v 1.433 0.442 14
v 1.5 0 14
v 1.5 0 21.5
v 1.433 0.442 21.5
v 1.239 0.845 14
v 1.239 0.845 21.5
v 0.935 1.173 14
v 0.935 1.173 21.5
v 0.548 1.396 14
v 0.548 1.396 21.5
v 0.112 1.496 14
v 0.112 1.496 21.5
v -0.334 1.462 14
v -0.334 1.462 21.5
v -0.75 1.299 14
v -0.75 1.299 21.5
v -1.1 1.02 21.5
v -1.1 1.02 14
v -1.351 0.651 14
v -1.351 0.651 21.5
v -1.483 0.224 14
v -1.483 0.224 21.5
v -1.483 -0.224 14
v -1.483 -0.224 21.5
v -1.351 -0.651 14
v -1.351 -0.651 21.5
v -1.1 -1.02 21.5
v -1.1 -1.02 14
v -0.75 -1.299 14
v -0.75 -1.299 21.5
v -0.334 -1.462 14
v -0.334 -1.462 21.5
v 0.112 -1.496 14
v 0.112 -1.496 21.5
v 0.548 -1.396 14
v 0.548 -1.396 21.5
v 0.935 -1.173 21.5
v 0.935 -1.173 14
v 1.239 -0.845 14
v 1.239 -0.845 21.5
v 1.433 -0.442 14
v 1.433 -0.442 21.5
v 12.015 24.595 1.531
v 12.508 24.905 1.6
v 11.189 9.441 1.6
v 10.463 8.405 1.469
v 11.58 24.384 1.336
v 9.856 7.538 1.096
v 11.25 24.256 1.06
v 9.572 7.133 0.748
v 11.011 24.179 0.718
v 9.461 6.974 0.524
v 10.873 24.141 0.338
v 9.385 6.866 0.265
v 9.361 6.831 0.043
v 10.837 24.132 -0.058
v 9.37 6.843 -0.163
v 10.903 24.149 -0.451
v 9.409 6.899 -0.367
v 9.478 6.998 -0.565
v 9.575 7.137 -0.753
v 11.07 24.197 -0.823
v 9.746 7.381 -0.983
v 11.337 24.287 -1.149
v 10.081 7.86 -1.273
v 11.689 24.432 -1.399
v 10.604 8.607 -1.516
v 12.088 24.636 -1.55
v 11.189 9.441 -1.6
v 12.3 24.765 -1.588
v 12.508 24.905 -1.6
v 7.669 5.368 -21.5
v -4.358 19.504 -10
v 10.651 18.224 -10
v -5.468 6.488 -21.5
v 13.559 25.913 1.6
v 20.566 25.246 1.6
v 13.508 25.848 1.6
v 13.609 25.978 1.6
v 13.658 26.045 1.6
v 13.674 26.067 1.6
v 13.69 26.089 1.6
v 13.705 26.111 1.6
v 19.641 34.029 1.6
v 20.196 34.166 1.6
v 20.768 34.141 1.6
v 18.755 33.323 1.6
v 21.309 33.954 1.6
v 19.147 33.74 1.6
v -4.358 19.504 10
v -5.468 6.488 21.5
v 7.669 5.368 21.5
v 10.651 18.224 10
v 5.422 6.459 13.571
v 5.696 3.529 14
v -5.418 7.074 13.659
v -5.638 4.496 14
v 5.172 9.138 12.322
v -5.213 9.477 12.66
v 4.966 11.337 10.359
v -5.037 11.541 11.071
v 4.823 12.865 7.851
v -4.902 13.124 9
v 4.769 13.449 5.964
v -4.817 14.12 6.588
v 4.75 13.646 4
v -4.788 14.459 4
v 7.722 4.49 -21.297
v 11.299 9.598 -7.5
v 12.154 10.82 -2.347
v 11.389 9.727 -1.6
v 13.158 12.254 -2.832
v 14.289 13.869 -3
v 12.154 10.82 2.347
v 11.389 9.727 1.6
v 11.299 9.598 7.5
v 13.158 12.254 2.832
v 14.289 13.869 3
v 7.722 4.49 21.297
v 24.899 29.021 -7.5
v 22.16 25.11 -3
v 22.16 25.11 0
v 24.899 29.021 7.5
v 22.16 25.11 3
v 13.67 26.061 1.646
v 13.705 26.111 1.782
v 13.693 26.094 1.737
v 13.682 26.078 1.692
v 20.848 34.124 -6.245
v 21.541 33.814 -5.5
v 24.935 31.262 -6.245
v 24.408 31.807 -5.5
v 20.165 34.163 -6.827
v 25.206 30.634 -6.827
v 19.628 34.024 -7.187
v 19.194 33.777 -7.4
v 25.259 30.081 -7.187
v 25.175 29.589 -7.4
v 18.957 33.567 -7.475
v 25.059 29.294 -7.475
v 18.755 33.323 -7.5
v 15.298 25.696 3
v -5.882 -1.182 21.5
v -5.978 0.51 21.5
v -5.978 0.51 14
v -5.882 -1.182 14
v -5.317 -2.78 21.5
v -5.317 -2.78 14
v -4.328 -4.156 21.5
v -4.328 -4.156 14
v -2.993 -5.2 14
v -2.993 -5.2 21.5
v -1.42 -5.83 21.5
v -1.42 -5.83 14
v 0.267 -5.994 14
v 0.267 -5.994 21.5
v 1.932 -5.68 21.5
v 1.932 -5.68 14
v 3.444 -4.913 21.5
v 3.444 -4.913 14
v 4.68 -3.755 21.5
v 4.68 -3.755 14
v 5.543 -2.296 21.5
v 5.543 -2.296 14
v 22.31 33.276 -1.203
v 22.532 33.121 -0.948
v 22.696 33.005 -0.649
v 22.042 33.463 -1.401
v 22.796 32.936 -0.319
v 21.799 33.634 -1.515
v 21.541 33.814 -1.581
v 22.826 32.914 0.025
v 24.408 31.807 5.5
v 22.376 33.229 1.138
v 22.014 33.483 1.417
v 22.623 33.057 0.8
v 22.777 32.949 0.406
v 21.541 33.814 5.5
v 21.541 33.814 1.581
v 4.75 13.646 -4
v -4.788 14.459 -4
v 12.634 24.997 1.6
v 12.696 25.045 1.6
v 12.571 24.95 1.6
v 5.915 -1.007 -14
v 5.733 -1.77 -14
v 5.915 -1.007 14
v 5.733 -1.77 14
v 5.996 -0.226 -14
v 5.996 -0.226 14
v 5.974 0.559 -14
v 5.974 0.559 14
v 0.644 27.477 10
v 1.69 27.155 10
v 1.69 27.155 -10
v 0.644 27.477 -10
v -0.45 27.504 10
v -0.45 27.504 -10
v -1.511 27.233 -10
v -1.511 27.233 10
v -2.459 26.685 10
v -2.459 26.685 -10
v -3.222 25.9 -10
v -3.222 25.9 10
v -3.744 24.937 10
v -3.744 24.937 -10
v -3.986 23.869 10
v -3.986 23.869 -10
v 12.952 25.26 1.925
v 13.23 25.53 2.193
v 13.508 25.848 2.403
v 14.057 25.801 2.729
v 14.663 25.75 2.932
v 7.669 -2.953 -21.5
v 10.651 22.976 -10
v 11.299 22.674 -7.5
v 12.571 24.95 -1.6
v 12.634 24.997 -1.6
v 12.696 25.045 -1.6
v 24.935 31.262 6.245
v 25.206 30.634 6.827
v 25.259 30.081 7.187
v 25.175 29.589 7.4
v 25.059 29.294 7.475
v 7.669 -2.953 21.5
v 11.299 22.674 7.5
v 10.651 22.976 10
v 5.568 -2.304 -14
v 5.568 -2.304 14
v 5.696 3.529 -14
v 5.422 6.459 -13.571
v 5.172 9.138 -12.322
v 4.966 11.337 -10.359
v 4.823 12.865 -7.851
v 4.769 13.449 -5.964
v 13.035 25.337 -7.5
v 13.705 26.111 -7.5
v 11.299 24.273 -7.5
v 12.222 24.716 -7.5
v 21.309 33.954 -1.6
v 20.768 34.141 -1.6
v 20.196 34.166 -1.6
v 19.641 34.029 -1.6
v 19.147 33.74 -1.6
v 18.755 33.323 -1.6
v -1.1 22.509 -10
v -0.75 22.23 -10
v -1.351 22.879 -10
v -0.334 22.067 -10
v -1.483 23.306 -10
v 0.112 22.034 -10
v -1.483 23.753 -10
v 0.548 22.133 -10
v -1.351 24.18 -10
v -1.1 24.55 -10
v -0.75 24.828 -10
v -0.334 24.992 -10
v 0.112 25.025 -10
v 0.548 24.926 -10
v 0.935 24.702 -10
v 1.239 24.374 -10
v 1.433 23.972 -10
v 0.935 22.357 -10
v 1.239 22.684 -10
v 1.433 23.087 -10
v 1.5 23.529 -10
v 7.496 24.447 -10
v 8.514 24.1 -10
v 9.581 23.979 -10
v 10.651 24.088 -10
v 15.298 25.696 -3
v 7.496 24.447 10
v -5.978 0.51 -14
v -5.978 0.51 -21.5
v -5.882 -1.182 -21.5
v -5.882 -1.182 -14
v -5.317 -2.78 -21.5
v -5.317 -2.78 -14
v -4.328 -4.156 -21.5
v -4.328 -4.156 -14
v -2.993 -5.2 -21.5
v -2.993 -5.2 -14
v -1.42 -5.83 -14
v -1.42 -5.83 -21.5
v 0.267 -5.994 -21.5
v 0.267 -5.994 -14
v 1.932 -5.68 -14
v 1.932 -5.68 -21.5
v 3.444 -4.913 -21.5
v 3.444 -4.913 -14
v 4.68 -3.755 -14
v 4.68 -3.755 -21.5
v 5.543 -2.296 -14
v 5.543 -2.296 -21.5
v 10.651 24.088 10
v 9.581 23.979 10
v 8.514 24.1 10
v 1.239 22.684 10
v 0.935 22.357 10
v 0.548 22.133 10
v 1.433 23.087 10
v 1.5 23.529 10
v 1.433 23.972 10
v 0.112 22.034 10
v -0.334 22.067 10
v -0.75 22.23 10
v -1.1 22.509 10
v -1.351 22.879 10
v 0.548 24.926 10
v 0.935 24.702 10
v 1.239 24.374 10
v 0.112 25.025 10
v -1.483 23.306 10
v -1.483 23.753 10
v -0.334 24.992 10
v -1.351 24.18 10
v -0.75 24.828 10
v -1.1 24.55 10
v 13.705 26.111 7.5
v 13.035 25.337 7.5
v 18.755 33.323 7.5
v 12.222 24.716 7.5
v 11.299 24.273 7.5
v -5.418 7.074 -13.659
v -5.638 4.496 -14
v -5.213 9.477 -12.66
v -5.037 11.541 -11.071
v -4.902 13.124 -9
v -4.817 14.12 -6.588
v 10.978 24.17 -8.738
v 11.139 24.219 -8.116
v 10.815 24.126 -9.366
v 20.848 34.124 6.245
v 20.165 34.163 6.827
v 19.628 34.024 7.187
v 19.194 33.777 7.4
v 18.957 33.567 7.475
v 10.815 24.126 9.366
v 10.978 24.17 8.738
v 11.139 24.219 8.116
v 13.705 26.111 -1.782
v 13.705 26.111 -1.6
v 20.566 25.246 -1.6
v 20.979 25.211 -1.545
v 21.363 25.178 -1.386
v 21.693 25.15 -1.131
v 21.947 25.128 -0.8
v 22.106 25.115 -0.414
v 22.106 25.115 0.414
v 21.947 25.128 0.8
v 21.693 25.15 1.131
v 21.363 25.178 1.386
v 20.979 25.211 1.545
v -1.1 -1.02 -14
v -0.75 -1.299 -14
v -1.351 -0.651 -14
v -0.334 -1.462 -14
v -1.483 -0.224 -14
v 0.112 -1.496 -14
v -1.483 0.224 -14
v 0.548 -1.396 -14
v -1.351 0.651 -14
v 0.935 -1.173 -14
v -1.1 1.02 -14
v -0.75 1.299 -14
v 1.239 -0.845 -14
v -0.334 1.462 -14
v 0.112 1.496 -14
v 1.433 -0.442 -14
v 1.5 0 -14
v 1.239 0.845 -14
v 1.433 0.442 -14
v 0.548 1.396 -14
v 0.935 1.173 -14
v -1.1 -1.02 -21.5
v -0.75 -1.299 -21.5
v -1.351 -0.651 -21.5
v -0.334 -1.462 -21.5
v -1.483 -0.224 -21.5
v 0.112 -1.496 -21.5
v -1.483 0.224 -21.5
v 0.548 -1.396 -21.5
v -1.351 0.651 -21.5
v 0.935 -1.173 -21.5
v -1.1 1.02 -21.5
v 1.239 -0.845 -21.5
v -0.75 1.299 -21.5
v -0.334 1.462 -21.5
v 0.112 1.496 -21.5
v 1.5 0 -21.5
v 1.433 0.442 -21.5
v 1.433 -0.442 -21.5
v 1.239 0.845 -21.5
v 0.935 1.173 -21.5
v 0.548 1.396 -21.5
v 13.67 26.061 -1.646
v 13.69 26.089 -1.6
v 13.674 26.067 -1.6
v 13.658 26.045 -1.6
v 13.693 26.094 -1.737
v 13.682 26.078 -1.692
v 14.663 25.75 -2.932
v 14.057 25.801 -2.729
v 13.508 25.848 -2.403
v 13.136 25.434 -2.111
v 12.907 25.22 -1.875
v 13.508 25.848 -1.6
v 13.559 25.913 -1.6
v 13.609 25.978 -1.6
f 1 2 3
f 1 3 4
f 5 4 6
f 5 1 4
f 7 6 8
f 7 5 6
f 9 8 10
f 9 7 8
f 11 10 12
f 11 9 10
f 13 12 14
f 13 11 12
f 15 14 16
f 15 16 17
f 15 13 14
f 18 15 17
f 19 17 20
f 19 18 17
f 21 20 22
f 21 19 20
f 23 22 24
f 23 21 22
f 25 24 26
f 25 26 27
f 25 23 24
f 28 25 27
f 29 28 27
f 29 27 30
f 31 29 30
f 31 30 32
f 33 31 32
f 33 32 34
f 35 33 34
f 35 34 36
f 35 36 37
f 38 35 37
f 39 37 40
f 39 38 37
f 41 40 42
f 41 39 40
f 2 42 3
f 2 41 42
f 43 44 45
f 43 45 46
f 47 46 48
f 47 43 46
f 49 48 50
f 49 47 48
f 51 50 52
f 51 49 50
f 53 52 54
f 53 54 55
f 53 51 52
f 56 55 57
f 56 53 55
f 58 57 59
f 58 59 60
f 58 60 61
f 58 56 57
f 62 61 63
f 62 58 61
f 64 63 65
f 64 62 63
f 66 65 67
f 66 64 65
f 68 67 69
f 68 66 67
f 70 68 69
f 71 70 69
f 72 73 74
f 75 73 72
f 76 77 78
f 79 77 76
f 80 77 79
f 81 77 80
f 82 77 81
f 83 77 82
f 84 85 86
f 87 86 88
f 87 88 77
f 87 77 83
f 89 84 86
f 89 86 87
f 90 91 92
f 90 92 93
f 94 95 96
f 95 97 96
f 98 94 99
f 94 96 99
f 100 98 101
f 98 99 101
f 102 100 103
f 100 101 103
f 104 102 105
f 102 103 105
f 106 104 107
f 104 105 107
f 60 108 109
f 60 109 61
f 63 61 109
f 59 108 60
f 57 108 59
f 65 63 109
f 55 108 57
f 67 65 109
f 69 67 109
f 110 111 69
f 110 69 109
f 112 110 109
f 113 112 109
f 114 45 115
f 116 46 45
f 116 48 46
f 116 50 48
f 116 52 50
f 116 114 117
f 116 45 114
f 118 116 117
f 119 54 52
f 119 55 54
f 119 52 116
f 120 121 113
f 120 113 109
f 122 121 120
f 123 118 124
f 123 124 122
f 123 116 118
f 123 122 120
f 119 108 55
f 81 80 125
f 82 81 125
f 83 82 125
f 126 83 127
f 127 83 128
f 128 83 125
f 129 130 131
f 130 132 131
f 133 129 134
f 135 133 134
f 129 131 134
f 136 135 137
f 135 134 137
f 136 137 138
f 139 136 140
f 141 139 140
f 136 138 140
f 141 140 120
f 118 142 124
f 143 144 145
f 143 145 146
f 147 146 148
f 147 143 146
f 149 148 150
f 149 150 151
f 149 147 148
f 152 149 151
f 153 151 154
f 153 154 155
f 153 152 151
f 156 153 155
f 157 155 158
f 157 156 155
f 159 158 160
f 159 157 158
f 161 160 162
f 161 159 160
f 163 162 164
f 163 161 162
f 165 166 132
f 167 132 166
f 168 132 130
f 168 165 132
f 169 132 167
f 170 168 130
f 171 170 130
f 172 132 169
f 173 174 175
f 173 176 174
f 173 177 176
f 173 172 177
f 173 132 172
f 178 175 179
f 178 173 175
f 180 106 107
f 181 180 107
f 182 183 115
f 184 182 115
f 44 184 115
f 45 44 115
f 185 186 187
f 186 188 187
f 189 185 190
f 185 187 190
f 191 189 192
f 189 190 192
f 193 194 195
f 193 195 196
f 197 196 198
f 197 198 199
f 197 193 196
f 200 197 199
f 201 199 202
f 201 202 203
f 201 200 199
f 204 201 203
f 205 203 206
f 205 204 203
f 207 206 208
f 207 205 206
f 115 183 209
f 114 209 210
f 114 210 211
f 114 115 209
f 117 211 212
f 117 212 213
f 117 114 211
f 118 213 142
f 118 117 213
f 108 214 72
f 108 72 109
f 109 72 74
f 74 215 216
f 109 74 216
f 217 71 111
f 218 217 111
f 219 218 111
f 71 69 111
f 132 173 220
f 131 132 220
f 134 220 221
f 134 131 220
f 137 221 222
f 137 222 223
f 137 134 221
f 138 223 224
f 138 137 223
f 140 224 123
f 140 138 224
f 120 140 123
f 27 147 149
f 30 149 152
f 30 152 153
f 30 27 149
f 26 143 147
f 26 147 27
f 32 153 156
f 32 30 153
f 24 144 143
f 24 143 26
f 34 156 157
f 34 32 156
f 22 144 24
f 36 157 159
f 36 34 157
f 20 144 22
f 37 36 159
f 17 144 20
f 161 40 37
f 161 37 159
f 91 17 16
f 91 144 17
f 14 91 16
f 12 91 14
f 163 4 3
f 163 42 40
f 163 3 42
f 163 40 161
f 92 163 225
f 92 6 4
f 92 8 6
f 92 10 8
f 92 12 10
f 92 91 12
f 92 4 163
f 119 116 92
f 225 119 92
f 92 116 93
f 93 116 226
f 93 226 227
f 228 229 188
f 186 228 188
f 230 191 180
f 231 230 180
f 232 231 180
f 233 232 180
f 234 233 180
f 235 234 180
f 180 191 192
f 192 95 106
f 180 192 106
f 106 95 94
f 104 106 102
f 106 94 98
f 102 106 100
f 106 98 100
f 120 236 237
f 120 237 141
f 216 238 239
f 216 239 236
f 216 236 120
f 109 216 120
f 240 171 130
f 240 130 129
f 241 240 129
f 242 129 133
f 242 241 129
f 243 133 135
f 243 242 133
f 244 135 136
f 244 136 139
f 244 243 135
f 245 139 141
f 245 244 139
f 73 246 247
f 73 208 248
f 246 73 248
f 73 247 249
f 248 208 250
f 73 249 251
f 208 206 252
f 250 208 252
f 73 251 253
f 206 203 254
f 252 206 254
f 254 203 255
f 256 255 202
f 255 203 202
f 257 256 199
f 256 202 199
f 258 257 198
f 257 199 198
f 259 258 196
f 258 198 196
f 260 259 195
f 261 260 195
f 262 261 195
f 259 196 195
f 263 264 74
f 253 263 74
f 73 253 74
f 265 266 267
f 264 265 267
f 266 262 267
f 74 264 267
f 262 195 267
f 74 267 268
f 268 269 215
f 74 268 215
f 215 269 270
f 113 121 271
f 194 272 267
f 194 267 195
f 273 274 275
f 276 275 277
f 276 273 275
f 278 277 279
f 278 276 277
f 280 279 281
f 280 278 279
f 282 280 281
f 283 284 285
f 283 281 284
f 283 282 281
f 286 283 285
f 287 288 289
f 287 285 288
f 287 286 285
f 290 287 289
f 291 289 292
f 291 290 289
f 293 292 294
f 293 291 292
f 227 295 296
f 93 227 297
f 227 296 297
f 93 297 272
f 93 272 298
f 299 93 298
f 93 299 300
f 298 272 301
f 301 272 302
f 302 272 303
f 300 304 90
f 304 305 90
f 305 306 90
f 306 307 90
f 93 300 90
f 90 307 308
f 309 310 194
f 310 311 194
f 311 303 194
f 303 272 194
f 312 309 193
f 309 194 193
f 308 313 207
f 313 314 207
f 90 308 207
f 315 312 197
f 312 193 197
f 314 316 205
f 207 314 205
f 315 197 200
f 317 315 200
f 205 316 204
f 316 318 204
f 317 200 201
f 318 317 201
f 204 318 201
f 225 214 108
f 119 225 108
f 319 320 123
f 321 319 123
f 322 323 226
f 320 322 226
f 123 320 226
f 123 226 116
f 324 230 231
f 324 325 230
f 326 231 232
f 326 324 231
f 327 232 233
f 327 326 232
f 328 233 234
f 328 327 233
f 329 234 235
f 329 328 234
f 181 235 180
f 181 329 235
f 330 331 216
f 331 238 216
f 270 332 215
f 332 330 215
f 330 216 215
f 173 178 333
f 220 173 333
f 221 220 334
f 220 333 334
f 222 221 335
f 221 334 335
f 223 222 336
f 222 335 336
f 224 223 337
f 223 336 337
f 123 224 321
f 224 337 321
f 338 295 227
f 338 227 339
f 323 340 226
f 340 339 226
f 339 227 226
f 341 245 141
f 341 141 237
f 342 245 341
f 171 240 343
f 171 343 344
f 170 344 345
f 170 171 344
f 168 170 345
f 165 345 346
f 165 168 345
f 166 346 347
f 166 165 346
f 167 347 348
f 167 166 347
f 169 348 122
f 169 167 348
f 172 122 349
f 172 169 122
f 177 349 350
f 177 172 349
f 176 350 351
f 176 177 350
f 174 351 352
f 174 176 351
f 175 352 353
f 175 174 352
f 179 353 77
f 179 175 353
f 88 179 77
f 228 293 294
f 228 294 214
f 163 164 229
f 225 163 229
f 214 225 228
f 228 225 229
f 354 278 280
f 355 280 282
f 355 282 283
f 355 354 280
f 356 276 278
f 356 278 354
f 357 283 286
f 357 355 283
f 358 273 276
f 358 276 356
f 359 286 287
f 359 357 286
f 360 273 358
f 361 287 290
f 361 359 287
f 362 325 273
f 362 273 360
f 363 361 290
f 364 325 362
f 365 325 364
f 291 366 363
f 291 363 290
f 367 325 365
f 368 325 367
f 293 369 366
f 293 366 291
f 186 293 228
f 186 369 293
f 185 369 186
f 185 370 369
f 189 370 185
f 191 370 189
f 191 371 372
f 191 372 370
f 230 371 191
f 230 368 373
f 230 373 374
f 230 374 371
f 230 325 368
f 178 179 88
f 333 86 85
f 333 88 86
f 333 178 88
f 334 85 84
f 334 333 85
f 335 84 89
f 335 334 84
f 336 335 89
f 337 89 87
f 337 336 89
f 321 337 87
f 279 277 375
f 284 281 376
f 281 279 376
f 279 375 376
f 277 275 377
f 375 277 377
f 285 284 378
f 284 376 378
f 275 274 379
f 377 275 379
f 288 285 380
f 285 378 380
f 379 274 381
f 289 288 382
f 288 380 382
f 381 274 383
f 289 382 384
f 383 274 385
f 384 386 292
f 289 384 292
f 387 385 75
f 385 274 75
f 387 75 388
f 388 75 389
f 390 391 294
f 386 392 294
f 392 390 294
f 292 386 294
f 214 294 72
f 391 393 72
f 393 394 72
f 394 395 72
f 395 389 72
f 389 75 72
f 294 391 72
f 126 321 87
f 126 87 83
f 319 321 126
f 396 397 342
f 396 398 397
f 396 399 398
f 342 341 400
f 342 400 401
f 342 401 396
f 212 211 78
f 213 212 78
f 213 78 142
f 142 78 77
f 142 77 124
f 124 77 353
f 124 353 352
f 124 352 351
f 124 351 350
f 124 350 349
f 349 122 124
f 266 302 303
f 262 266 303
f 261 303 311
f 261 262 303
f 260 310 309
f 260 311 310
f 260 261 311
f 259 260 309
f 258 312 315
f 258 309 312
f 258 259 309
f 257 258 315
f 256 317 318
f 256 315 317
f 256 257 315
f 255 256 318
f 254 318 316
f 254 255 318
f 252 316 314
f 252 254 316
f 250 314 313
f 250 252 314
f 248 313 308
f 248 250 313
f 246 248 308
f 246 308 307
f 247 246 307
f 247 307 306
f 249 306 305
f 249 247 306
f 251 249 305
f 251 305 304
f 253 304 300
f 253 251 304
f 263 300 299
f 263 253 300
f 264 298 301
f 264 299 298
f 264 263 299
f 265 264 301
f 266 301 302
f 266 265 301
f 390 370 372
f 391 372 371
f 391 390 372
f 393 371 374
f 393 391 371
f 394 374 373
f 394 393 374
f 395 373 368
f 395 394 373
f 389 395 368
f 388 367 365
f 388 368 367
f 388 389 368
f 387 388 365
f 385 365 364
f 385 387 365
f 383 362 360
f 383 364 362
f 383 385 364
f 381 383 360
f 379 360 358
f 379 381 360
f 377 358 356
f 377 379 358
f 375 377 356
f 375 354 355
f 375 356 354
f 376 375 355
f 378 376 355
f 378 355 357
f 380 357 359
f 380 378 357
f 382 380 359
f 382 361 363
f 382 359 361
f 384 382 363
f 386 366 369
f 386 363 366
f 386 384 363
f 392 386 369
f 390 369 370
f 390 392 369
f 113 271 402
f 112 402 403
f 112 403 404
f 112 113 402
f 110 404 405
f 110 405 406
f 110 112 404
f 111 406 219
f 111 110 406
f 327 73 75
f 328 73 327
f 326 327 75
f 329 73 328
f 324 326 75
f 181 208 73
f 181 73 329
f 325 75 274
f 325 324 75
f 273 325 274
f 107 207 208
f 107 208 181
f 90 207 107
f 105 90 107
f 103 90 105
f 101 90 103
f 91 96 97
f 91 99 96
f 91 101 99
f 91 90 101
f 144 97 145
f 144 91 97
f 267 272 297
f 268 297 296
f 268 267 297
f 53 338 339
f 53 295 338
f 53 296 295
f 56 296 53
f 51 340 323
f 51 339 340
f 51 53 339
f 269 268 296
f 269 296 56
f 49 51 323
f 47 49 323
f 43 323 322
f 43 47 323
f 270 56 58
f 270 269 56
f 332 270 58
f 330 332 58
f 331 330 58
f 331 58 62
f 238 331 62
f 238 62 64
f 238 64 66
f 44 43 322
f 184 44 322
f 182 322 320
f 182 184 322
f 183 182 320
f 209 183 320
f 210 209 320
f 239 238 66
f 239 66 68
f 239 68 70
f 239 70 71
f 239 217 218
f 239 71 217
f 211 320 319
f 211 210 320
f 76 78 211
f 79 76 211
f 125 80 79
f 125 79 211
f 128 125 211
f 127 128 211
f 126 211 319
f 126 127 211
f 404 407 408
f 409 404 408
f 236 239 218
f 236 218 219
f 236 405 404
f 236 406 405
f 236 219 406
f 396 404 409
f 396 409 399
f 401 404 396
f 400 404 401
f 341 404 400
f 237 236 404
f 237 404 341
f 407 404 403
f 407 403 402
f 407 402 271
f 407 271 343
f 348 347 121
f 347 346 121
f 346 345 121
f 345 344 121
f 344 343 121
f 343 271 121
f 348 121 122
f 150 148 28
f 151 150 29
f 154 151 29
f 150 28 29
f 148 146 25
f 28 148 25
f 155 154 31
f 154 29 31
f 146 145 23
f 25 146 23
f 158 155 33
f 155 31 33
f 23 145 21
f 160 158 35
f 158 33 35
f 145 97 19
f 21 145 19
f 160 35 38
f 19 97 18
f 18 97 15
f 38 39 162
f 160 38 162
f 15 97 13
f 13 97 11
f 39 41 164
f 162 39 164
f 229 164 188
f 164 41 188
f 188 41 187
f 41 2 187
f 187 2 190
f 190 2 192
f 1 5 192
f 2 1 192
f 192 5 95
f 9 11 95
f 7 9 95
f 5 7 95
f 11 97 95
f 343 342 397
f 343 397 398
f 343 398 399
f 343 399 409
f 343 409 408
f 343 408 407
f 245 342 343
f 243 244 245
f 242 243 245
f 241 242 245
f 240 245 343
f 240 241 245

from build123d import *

# Parameters (mm, degrees)
SKETCH2_R                 = 1.5
MAIN_EXTRUDE_DEPTH        = 21.5
HORIZONTAL_CUT_DEPTH      = 48.59062889
HORIZONTAL_CUT_DEPTH_BACK = 48.59062889
SKETCH5_OUTSIDE_W         = 47.542
SKETCH5_OUTSIDE_H         = 58.496
VERTICAL_CUT_DEPTH        = 15.063100578
END_FILLET_R              = 2
SPRING_PLACE_CUT_DEPTH    = 14
FILLET5_R                 = 10
FILLET4_R                 = 5
CUT_EXTRUDE1_DEPTH        = 52.882041504
CUT_EXTRUDE2_START        = -16.243126
CUT_EXTRUDE2_DEPTH        = 16.243126


# Read off the part's stored shape, not the designer's step: vertical-cut
with BuildPart() as part:
    # Sketch2 → main-extrude (new, symmetric)
    with BuildSketch(Plane.XY):
        with BuildLine():
            Line((26.046045858, 30.659682992), (19.902405526, 34.961506265))
            Line((19.902405526, 34.961506265), (11.298758981, 22.6742256))
            Line((11.298758981, 22.6742256), (1.690473047, 27.154642913))
            ThreePointArc((1.690473047, 27.154642913), (-2.003746596, 26.991347579), (-3.985523805, 23.869411765))
            Line((-3.985523805, 23.869411765), (-5.978285707, 0.51))
            ThreePointArc((-5.978285707, 0.51), (-1.419809226, -5.829591904), (5.543277195, -2.296100594))
            Line((5.543277195, -2.296100594), (7.669311717, -2.952527164))
            Line((7.669311717, -2.952527164), (7.722039638, 4.490290033))
            Line((7.722039638, 4.490290033), (26.046045858, 30.659682992))
        make_face()
        Circle(SKETCH2_R, mode=Mode.SUBTRACT)
        with Locations((0, 23.529411765)):
            Circle(SKETCH2_R, mode=Mode.SUBTRACT)
    extrude(amount=MAIN_EXTRUDE_DEPTH, both=True)

    # Sketch5 outside → horizontal-cut (cut, two sides: drawn at the far end of the back side and taken through both)
    with BuildSketch(Plane(origin=(0, 27.529411765, 0), x_dir=(-1, 0, 0), z_dir=(0, -1, 0)).offset(-HORIZONTAL_CUT_DEPTH_BACK)):
        with Locations((-10.023, 0)):
            Rectangle(SKETCH5_OUTSIDE_W, SKETCH5_OUTSIDE_H)
        Polygon((-5.543277195, -21.5), (6, -21.5), (6, 21.5), (-5.543277195, 21.5), (-7.669311717, 21.5), (-11.298758981, 7.5), (-26.046045858, 7.5), (-26.046045858, -7.5), (-11.298758981, -7.5), (-7.669311717, -21.5), align=None, mode=Mode.SUBTRACT)
    extrude(amount=HORIZONTAL_CUT_DEPTH + HORIZONTAL_CUT_DEPTH_BACK, mode=Mode.SUBTRACT)

    # vertical-cut outline → vertical-cut (cut)
    with BuildSketch(Plane(origin=(-1.956623805, 47.652438964, 0), x_dir=(0, 0, 1), z_dir=(0.9963809512430475, -0.08499999999999992, 0))):
        Polygon((10, 28.250815058), (10, 18), (21.5, 18), (21.5, 41.313669441), align=None)
        Polygon((-21.5, 18), (-10, 18), (-10, 28.250815058), (-21.5, 41.313669441), align=None)
    extrude(amount=VERTICAL_CUT_DEPTH, mode=Mode.SUBTRACT)

    # end-fillet
    end_fillet_edges = [part.edges().sort_by_distance(p)[0] for p in [
        (19.902405526, 34.961506265, 0),
        (26.046045858, 30.659682992, 0),
        (22.974225692, 32.810594628, 7.5),
        (22.974225692, 32.810594628, -7.5),
    ]]
    fillet(end_fillet_edges, radius=END_FILLET_R)

    # Sketch13 → spring-place-cut (cut, symmetric)
    with BuildSketch(Plane.XY):
        with BuildLine():
            Line((4.750311853, 13.645607612), (-4.788285707, 14.459333317))
            Line((-4.788285707, 14.459333317), (-5.468285707, 6.488285707))
            Line((-5.468285707, 6.488285707), (-5.978285707, 0.51))
            ThreePointArc((-5.978285707, 0.51), (-1.419809226, -5.829591904), (5.543277195, -2.296100594))
            Line((5.543277195, -2.296100594), (5.568173284, -2.303787419))
            Line((5.568173284, -2.303787419), (5.732956787, -1.770086573))
            ThreePointArc((5.732956787, -1.770086573), (5.96812639, -0.61763047), (5.973944242, 0.558560826))
            Line((5.973944242, 0.558560826), (4.750311853, 13.645607612))
        make_face()
    extrude(amount=SPRING_PLACE_CUT_DEPTH, both=True, mode=Mode.SUBTRACT)

    # Fillet5
    fillet5_edges = [part.edges().sort_by_distance(p)[0] for p in [
        (-0.018986927, 14.052470465, 14),
        (-0.018986927, 14.052470465, -14),
    ]]
    fillet(fillet5_edges, radius=FILLET5_R)

    # Fillet4
    # the kernel refuses this fillet: 5 mm, written as the material it adds along each edge
    with BuildSketch(Plane(origin=(11.298758981, 22.6742256, -17.98874539), x_dir=(-0.9063077870366477, 0.42261826174070405, 0), z_dir=(0, 0, 1))) as fillet4_piece_1_section:
        with BuildLine():
            CenterArc((FILLET4_R * 0.839099631177, -FILLET4_R), FILLET4_R, 90, 80)
            Line((-FILLET4_R * 0.145708121835, -FILLET4_R * 0.826351822333), (0, 0))
            Line((0, 0), (FILLET4_R * 0.839099631177, 0))
        make_face()
    fillet4_piece_1 = extrude(amount=25.48874539, mode=Mode.PRIVATE)
    fillet4_piece_1 = split(fillet4_piece_1, bisect_by=Plane(origin=(9.938648559, 23.630642265, -10), z_dir=(0, 0, 1)), keep=Keep.TOP, mode=Mode.PRIVATE)
    fillet4_piece_1 = split(fillet4_piece_1, bisect_by=Plane(origin=(10.933336463, 23.630642265, -8.909557674), z_dir=(-0.9679999612731994, 0, 0.25095034364408525)), keep=Keep.TOP, mode=Mode.PRIVATE)
    fillet4_piece_1 = split(fillet4_piece_1, bisect_by=Plane(origin=(9.938648559, 23.630642265, -7.5), z_dir=(0, 0, -1)), keep=Keep.TOP, mode=Mode.PRIVATE)
    add(fillet4_piece_1)
    with BuildSketch(Plane(origin=(11.298758981, 22.6742256, -7.5), x_dir=(-0.9063077870366477, 0.42261826174070405, 0), z_dir=(0, 0, 1))) as fillet4_piece_2_section:
        with BuildLine():
            CenterArc((FILLET4_R * 0.839099631177, -FILLET4_R), FILLET4_R, 90, 80)
            Line((-FILLET4_R * 0.145708121835, -FILLET4_R * 0.826351822333), (0, 0))
            Line((0, 0), (FILLET4_R * 0.839099631177, 0))
        make_face()
    fillet4_piece_2 = extrude(amount=15, mode=Mode.PRIVATE)
    fillet4_piece_2 = split(fillet4_piece_2, bisect_by=Plane(origin=(13.081425039, 23.673797808, 0.623656853), z_dir=(-0.9679999612731994, 0, -0.2509503436440852)), keep=Keep.TOP, mode=Mode.PRIVATE)
    fillet4_piece_2 = split(fillet4_piece_2, bisect_by=Plane(origin=(13.081425039, 23.673797808, -0.623656853), z_dir=(-0.9679999612731994, 0, 0.25095034364408525)), keep=Keep.TOP, mode=Mode.PRIVATE)
    add(fillet4_piece_2)
    with BuildSketch(Plane(origin=(11.298758981, 22.6742256, -7.5), x_dir=(-0.9063077870366477, 0.42261826174070405, 0), z_dir=(0, 0, 1))) as fillet4_piece_3_section:
        with BuildLine():
            CenterArc((FILLET4_R * 0.839099631177, -FILLET4_R), FILLET4_R, 90, 80)
            Line((-FILLET4_R * 0.145708121835, -FILLET4_R * 0.826351822333), (0, 0))
            Line((0, 0), (FILLET4_R * 0.839099631177, 0))
        make_face()
    fillet4_piece_3 = extrude(amount=15, mode=Mode.PRIVATE)
    fillet4_piece_3 = split(fillet4_piece_3, bisect_by=Plane(origin=(14.480371863, 24.591366471, -4.772552021), z_dir=(-0.9679999612731994, 0, -0.2509503436440852)), keep=Keep.TOP, mode=Mode.PRIVATE)
    fillet4_piece_3 = split(fillet4_piece_3, bisect_by=Plane(origin=(11.912432267, 24.591366471, -5.132855534), z_dir=(0.9679999612731994, 0, -0.25095034364408525)), keep=Keep.TOP, mode=Mode.PRIVATE)
    add(fillet4_piece_3)
    with BuildSketch(Plane(origin=(11.298758981, 22.6742256, -7.5), x_dir=(-0.9063077870366477, 0.42261826174070405, 0), z_dir=(0, 0, 1))) as fillet4_piece_4_section:
        with BuildLine():
            CenterArc((FILLET4_R * 0.839099631177, -FILLET4_R), FILLET4_R, 90, 80)
            Line((-FILLET4_R * 0.145708121835, -FILLET4_R * 0.826351822333), (0, 0))
            Line((0, 0), (FILLET4_R * 0.839099631177, 0))
        make_face()
    fillet4_piece_4 = extrude(amount=15, mode=Mode.PRIVATE)
    fillet4_piece_4 = split(fillet4_piece_4, bisect_by=Plane(origin=(11.912432267, 24.591366471, 5.132855534), z_dir=(0.9679999612731994, 0, 0.2509503436440852)), keep=Keep.TOP, mode=Mode.PRIVATE)
    fillet4_piece_4 = split(fillet4_piece_4, bisect_by=Plane(origin=(14.480371863, 24.591366471, 4.772552021), z_dir=(-0.9679999612731994, 0, 0.25095034364408525)), keep=Keep.TOP, mode=Mode.PRIVATE)
    add(fillet4_piece_4)
    with BuildSketch(Plane(origin=(11.298758981, 22.6742256, -7.5), x_dir=(-0.9063077870366477, 0.42261826174070405, 0), z_dir=(0, 0, 1))) as fillet4_piece_5_section:
        with BuildLine():
            CenterArc((FILLET4_R * 0.839099631177, -FILLET4_R), FILLET4_R, 90, 80)
            Line((-FILLET4_R * 0.145708121835, -FILLET4_R * 0.826351822333), (0, 0))
            Line((0, 0), (FILLET4_R * 0.839099631177, 0))
        make_face()
    fillet4_piece_5 = extrude(amount=25.48874539, mode=Mode.PRIVATE)
    fillet4_piece_5 = split(fillet4_piece_5, bisect_by=Plane(origin=(9.938648559, 23.630642265, 10), z_dir=(0, 0, -1)), keep=Keep.TOP, mode=Mode.PRIVATE)
    fillet4_piece_5 = split(fillet4_piece_5, bisect_by=Plane(origin=(10.933336463, 23.630642265, 8.909557674), z_dir=(-0.9679999612731994, 0, -0.2509503436440852)), keep=Keep.TOP, mode=Mode.PRIVATE)
    fillet4_piece_5 = split(fillet4_piece_5, bisect_by=Plane(origin=(9.938648559, 23.630642265, 7.5), z_dir=(0, 0, 1)), keep=Keep.TOP, mode=Mode.PRIVATE)
    add(fillet4_piece_5)
    with BuildSketch(Plane(origin=(11.298758981, 22.6742256, -7.5), x_dir=(-0.9063077870366477, 0.42261826174070405, 0), z_dir=(0, 0, 1))) as fillet4_piece_6_section:
        with BuildLine():
            CenterArc((FILLET4_R * 0.839099631177, -FILLET4_R), FILLET4_R, 90, 80)
            Line((-FILLET4_R * 0.145708121835, -FILLET4_R * 0.826351822333), (0, 0))
            Line((0, 0), (FILLET4_R * 0.839099631177, 0))
        make_face()
    fillet4_piece_6 = extrude(amount=15, mode=Mode.PRIVATE)
    fillet4_piece_6 = split(fillet4_piece_6, bisect_by=Plane(origin=(13.263621158, 25.832677019, -0.079134917), z_dir=(0.9679999612731994, 0, 0.2509503436440852)), keep=Keep.TOP, mode=Mode.PRIVATE)
    fillet4_piece_6 = split(fillet4_piece_6, bisect_by=Plane(origin=(13.263621158, 25.832677019, 0.079134917), z_dir=(0.9679999612731994, 0, -0.25095034364408525)), keep=Keep.TOP, mode=Mode.PRIVATE)
    add(fillet4_piece_6)

    # Sketch16 → Cut-Extrude1 (cut, through all)
    with BuildSketch(Plane(origin=(3.042409669, 35.663518124, 0), x_dir=(0.9963809512430474, -0.08499999999999996, 0), z_dir=(0.08499999999999996, 0.9963809512430474, 0))):
        with BuildLine():
            Line((18.345710894, -1.6), (10.345710894, -1.6))
            ThreePointArc((10.345710894, -1.6), (8.745710894, 0), (10.345710894, 1.6))
            Line((10.345710894, 1.6), (18.345710894, 1.6))
            ThreePointArc((18.345710894, 1.6), (19.945710894, 0), (18.345710894, -1.6))
        make_face()
    extrude(amount=-CUT_EXTRUDE1_DEPTH, mode=Mode.SUBTRACT)

    # Sketch17 → Cut-Extrude2 (cut)
    with BuildSketch(Plane(origin=(2.286753534, 26.80561955, 0), x_dir=(0.9963809512430474, -0.08499999999999996, 0), z_dir=(0.08499999999999996, 0.9963809512430474, 0)).offset(CUT_EXTRUDE2_START)):
        with BuildLine():
            Line((24.627792818, 3), (13.058532698, 3))
            ThreePointArc((13.058532698, 3), (10.058532698, 0), (13.058532698, -3))
            Line((13.058532698, -3), (24.627792818, -3))
            ThreePointArc((24.627792818, -3), (27.627792818, 0), (24.627792818, 3))
        make_face()
    extrude(amount=CUT_EXTRUDE2_DEPTH, mode=Mode.SUBTRACT)


solid = part.part
